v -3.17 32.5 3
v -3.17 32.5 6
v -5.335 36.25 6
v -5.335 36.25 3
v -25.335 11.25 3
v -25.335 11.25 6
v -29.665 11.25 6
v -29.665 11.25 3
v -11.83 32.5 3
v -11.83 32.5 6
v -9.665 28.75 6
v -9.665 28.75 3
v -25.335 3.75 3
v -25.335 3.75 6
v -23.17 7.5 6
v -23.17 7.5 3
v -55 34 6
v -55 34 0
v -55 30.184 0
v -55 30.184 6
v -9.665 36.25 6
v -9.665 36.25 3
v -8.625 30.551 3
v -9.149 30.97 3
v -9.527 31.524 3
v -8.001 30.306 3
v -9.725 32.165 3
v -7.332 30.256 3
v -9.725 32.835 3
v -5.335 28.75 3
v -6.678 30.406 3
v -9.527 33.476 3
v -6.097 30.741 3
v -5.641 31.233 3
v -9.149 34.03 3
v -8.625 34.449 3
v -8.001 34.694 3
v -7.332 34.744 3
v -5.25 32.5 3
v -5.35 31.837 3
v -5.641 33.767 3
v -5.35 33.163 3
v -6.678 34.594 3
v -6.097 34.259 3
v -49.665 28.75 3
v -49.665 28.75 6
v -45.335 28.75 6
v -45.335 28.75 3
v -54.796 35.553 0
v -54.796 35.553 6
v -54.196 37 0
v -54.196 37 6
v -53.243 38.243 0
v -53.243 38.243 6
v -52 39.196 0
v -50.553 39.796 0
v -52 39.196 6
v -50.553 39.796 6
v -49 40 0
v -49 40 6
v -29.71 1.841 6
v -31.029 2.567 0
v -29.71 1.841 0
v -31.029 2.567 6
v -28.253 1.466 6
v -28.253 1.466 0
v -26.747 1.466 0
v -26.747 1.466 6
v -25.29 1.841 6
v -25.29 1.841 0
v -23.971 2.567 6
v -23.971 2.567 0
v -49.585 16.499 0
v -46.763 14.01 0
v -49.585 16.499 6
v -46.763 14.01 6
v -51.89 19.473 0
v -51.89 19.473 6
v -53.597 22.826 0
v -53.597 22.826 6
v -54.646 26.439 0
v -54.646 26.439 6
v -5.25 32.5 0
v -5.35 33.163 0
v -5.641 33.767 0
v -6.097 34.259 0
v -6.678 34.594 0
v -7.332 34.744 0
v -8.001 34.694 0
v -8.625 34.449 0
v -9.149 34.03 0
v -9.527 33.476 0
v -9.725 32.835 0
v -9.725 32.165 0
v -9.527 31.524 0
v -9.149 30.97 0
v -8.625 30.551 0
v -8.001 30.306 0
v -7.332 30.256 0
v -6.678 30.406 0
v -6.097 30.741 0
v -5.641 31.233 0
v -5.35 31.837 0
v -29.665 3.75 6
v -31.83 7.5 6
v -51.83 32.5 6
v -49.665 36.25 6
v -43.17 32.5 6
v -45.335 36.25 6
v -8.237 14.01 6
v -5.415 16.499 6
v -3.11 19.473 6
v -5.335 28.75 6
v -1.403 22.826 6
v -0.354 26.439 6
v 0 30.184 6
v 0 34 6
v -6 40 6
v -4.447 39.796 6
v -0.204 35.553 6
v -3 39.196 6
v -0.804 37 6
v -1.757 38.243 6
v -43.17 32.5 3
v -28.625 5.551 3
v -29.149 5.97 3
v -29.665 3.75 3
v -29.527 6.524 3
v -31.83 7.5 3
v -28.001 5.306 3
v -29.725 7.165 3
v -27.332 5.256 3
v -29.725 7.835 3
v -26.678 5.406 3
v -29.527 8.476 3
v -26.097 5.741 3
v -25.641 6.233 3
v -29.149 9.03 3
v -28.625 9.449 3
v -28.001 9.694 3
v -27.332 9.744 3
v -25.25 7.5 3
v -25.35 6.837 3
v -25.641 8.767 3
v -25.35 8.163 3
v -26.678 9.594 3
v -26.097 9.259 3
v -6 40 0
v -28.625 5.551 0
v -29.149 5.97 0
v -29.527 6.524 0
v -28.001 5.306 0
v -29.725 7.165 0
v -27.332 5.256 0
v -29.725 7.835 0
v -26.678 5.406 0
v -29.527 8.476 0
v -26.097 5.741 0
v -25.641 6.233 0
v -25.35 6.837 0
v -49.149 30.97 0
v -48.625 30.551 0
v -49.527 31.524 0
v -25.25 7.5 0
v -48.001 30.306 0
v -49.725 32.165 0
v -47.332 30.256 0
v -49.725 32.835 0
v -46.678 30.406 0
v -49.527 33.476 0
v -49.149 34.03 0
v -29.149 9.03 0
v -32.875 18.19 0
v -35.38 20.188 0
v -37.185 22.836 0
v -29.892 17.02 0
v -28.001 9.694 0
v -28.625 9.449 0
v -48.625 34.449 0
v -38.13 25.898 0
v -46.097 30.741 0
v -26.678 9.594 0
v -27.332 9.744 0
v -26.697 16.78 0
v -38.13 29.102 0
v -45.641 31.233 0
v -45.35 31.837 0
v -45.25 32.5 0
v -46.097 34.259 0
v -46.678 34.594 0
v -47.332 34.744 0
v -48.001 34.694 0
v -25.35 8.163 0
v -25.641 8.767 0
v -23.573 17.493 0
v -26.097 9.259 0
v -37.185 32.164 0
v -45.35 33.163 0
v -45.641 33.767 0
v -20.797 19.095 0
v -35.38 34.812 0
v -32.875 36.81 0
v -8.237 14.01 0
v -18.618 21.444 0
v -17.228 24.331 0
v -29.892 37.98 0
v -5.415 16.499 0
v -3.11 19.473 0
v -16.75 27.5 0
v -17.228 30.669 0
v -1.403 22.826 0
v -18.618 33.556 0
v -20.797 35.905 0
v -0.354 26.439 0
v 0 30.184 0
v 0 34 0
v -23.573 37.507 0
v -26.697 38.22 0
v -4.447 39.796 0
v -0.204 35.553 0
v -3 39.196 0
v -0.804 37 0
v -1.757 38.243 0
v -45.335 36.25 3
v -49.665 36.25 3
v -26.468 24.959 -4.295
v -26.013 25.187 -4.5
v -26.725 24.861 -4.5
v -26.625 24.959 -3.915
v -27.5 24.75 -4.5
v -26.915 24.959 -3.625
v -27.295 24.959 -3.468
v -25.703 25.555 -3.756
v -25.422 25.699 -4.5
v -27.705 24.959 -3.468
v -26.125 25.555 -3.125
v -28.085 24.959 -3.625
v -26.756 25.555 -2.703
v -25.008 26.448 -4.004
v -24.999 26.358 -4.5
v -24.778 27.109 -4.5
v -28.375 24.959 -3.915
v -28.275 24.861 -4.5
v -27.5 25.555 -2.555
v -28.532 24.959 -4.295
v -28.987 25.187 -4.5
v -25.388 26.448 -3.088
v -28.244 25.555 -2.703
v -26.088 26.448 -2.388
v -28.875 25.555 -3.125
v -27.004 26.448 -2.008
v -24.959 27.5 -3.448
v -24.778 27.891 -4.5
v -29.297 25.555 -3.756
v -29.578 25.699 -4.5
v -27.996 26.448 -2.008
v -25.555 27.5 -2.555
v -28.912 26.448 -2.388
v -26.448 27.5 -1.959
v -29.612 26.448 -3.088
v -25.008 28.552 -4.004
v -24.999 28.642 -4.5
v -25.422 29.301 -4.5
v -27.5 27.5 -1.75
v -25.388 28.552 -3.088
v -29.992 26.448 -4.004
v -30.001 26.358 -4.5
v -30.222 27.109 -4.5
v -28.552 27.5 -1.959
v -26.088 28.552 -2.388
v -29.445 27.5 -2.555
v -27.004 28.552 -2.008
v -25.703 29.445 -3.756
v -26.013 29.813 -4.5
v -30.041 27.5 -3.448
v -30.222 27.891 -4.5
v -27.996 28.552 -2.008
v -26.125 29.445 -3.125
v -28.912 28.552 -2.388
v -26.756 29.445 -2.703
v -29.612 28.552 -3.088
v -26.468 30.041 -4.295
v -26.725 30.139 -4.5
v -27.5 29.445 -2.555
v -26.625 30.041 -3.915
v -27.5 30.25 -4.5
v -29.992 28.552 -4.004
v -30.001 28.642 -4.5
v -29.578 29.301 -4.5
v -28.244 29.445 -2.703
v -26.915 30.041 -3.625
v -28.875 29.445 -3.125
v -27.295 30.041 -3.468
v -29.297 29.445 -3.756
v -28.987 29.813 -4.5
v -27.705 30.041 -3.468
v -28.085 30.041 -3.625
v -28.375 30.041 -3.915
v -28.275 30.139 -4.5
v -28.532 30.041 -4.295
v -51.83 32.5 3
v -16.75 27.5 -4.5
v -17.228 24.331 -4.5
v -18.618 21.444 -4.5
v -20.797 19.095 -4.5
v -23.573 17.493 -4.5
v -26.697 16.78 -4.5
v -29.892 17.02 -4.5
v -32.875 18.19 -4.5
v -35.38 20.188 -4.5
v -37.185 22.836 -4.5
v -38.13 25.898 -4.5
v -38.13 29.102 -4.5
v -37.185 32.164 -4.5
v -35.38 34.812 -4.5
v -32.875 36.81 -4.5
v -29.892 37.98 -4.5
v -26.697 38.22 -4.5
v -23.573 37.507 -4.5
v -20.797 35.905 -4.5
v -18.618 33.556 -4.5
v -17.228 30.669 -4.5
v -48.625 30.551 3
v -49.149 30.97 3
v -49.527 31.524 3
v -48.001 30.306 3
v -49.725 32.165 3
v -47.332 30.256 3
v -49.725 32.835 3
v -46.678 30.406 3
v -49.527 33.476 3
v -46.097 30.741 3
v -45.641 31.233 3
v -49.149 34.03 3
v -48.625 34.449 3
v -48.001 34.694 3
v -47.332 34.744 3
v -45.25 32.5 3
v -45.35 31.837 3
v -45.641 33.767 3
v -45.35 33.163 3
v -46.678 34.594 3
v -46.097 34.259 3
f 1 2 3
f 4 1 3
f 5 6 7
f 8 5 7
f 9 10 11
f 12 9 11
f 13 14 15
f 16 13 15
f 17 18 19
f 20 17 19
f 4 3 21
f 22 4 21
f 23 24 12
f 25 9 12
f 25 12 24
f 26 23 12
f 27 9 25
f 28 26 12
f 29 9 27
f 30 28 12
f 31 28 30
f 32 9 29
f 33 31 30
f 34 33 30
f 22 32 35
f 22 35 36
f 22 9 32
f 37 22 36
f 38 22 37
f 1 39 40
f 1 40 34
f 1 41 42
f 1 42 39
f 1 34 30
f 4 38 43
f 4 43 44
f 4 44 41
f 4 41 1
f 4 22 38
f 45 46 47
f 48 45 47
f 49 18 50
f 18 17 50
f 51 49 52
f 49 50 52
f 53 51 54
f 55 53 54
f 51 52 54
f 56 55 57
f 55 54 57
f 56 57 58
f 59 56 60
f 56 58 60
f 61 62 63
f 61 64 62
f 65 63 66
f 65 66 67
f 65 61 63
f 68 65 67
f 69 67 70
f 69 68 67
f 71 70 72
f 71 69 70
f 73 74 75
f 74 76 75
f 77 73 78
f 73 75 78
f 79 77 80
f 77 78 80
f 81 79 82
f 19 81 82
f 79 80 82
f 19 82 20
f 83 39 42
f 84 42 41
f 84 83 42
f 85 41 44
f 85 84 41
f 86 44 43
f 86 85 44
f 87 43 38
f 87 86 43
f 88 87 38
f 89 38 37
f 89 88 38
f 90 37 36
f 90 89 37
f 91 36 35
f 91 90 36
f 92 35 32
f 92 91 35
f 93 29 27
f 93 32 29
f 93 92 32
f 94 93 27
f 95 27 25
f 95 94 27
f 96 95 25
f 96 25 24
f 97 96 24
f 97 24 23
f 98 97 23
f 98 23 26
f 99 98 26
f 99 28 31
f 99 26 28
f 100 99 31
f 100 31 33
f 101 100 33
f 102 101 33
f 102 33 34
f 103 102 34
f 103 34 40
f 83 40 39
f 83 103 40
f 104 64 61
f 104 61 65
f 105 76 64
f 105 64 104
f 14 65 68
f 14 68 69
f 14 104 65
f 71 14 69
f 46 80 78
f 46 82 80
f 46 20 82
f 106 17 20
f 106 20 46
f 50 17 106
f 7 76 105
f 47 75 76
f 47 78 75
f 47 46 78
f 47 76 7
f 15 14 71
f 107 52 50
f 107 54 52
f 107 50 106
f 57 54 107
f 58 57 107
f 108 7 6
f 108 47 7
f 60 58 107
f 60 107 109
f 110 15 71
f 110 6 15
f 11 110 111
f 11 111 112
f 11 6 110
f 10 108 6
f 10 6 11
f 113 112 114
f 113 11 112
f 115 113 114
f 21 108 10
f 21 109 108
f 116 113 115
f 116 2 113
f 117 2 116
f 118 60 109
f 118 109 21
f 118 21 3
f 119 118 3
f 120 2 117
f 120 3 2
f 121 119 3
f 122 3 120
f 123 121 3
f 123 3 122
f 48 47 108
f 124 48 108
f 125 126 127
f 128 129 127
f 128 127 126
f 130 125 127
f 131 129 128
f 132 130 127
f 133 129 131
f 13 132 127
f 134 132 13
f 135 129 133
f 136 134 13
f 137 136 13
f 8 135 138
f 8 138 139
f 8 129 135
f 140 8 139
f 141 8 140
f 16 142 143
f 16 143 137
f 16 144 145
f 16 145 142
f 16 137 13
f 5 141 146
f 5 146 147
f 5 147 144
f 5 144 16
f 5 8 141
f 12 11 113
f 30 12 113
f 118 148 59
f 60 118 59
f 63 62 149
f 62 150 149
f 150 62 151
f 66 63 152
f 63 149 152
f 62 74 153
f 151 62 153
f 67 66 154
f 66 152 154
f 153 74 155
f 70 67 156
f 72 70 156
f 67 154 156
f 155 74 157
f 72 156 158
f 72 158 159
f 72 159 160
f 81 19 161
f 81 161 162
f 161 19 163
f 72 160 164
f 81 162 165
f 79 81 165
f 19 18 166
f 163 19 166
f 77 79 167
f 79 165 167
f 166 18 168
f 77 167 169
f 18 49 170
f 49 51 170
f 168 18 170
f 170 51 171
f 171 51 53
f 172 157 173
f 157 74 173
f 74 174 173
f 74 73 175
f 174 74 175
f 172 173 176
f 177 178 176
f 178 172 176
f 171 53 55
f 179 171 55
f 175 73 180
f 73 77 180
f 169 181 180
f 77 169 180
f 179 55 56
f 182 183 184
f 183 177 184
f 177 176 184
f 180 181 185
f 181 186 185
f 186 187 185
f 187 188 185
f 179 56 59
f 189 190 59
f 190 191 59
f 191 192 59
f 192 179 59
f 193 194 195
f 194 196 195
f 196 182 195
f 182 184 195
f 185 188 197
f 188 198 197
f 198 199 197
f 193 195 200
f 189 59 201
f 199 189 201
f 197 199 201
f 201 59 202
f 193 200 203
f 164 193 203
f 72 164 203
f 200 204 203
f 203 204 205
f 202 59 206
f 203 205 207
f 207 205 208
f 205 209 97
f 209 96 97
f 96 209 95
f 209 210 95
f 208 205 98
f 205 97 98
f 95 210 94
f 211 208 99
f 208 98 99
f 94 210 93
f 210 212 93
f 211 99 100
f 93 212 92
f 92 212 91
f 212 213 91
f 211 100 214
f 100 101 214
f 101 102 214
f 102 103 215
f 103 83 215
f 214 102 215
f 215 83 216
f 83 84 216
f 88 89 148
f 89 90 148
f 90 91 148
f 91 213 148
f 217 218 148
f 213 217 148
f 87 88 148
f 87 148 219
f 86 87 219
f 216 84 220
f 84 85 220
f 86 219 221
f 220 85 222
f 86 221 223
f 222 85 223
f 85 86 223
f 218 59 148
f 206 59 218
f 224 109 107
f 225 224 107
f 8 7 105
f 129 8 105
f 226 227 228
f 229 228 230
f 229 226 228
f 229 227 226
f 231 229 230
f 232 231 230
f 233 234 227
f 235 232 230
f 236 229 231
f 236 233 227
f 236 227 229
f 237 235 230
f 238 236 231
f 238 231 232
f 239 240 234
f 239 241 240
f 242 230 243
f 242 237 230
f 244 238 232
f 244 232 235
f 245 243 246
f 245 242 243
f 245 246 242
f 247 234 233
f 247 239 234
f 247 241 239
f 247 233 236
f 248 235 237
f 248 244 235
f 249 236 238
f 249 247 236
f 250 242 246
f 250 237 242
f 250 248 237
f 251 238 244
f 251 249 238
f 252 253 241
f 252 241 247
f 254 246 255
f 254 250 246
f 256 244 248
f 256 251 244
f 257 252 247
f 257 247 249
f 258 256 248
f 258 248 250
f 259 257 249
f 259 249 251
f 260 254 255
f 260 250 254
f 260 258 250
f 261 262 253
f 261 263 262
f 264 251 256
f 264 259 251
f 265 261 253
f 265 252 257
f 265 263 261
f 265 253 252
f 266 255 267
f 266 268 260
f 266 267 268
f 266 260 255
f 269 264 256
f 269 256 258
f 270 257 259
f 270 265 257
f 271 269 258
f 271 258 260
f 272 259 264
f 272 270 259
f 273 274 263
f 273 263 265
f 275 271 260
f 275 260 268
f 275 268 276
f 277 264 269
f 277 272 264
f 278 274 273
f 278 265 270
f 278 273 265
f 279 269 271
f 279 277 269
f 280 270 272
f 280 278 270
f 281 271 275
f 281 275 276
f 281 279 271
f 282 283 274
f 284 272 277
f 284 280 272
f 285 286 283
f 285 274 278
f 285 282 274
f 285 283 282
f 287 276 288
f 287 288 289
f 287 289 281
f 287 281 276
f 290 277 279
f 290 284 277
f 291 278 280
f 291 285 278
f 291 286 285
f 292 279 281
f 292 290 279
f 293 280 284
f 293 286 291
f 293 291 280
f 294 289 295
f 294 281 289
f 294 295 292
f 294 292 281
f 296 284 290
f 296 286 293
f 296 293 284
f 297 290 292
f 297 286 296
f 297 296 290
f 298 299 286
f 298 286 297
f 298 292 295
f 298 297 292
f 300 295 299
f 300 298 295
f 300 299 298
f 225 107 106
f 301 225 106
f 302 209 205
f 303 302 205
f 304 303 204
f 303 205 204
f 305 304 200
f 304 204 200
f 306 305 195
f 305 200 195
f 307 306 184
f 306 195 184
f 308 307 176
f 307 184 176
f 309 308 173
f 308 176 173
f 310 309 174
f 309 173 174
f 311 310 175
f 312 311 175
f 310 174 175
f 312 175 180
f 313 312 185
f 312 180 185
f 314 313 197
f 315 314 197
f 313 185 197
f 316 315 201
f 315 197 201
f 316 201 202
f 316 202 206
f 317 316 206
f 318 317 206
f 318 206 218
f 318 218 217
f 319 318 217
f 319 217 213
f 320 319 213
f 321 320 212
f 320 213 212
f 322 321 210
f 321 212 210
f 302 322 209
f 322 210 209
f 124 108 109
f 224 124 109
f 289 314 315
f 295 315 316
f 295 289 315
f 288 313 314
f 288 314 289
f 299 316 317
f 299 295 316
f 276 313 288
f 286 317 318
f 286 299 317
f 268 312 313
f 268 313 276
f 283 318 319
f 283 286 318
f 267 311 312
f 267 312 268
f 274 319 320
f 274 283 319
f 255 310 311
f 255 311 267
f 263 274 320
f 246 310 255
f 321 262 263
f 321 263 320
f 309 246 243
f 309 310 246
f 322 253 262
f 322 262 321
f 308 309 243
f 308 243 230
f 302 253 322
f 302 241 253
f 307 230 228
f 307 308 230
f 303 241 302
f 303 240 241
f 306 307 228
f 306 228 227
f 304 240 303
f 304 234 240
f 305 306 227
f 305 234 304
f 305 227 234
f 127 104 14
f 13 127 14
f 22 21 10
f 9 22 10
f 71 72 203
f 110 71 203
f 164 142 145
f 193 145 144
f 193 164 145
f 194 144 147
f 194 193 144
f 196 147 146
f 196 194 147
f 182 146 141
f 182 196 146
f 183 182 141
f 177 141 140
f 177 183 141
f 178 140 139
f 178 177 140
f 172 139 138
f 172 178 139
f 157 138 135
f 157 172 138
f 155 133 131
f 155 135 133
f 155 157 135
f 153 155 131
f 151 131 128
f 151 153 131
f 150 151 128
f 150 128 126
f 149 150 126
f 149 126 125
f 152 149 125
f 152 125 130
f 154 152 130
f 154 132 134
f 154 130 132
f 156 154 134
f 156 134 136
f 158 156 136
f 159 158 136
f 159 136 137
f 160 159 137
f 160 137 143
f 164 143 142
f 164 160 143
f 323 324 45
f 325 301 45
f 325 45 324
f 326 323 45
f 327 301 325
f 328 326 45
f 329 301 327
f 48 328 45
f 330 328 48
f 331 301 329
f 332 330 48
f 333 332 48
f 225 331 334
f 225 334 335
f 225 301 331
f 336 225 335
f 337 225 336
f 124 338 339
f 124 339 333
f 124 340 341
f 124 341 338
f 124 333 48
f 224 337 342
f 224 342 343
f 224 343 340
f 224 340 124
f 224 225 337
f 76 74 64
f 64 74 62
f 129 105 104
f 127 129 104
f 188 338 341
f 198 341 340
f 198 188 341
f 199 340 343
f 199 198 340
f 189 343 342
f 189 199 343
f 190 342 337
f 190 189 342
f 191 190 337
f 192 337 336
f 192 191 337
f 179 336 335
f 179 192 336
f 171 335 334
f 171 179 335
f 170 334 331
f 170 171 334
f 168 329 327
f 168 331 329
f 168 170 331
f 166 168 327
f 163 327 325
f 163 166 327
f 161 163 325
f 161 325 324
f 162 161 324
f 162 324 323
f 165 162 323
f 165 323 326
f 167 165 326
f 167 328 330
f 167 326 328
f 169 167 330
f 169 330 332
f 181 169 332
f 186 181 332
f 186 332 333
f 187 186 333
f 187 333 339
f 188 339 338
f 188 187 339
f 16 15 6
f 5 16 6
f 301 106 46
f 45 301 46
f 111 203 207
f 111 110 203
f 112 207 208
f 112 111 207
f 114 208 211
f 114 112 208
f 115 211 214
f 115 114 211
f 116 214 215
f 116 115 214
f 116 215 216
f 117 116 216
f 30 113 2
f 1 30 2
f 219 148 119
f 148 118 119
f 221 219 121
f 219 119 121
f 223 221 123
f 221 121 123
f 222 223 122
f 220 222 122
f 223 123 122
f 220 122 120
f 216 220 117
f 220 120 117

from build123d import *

# Parameters (mm, degrees)
ESQUISSE1_R             = 2.25
BOSS_EXTRU_1_DEPTH      = 6
CONG_2_R                = 6
CONG_3_R                = 20
ESQUISSE2_R             = 10.75
BOSS_EXTRU_2_DEPTH      = 4.5
ENL_V_MAT_EXTRU_1_DEPTH = 3


with BuildPart() as part:
    # Esquisse1 → Boss.-Extru.1 (new body)
    with BuildSketch(Plane.XY):
        Polygon((-55, 20), (-27.5, 0), (0, 20), (0, 40), (-55, 40), align=None)
        with Locations((-47.5, 32.5)):
            Circle(ESQUISSE1_R, mode=Mode.SUBTRACT)
        with Locations((-7.5, 32.5)):
            Circle(ESQUISSE1_R, mode=Mode.SUBTRACT)
        with Locations((-27.5, 7.5)):
            Circle(ESQUISSE1_R, mode=Mode.SUBTRACT)
    extrude(amount=BOSS_EXTRU_1_DEPTH)

    # Congé2
    cong_2_edges = [part.edges().sort_by_distance(p)[0] for p in [
        (-55, 40, 3),
        (0, 40, 3),
        (-27.5, 0, 3),
    ]]
    fillet(cong_2_edges, radius=CONG_2_R)

    # Congé3
    cong_3_edges = [part.edges().sort_by_distance(p)[0] for p in [
        (0, 20, 3),
        (-55, 20, 3),
    ]]
    fillet(cong_3_edges, radius=CONG_3_R)

    # Esquisse2 → Boss.-Extru.2 (add)
    with BuildSketch(Plane(origin=(0, 0, 0), x_dir=(-1, 0, 0), z_dir=(0, 0, -1))):
        with Locations(Location((27.5, 27.5, 0), (0, 0, 180))):  # turned: the seam where the file's is
            Circle(ESQUISSE2_R)
    extrude(amount=BOSS_EXTRU_2_DEPTH)

    # Esquisse3 → Enlèvement de matière-Révolution5 (revolve, cut)
    with BuildSketch(Plane(origin=(0, 0, -4.5), x_dir=(-1, 0, 0), z_dir=(0, 0, -1))):
        with BuildLine():
            Line((27.5, 30.25), (27.5, 24.75))
            ThreePointArc((27.5, 24.75), (24.75, 27.5), (27.5, 30.25))
        make_face()
    revolve(axis=Axis((-27.5, 30.25, -4.5), (0, -1, 0)), mode=Mode.SUBTRACT)

    # Esquisse4 → Enlèv. mat.-Extru.1 (cut)
    with BuildSketch(Plane.XY.offset(6)):
        Polygon((-43.169872981, 32.5), (-45.334936491, 36.25), (-49.665063509, 36.25), (-51.830127019, 32.5), (-49.665063509, 28.75), (-45.334936491, 28.75), align=None)
        Polygon((-11.830127019, 32.5), (-9.665063509, 28.75), (-5.334936491, 28.75), (-3.169872981, 32.5), (-5.334936491, 36.25), (-9.665063509, 36.25), align=None)
        Polygon((-23.169872981, 7.5), (-25.334936491, 11.25), (-29.665063509, 11.25), (-31.830127019, 7.5), (-29.665063509, 3.75), (-25.334936491, 3.75), align=None)
    extrude(amount=-ENL_V_MAT_EXTRU_1_DEPTH, mode=Mode.SUBTRACT)


solid = part.part
